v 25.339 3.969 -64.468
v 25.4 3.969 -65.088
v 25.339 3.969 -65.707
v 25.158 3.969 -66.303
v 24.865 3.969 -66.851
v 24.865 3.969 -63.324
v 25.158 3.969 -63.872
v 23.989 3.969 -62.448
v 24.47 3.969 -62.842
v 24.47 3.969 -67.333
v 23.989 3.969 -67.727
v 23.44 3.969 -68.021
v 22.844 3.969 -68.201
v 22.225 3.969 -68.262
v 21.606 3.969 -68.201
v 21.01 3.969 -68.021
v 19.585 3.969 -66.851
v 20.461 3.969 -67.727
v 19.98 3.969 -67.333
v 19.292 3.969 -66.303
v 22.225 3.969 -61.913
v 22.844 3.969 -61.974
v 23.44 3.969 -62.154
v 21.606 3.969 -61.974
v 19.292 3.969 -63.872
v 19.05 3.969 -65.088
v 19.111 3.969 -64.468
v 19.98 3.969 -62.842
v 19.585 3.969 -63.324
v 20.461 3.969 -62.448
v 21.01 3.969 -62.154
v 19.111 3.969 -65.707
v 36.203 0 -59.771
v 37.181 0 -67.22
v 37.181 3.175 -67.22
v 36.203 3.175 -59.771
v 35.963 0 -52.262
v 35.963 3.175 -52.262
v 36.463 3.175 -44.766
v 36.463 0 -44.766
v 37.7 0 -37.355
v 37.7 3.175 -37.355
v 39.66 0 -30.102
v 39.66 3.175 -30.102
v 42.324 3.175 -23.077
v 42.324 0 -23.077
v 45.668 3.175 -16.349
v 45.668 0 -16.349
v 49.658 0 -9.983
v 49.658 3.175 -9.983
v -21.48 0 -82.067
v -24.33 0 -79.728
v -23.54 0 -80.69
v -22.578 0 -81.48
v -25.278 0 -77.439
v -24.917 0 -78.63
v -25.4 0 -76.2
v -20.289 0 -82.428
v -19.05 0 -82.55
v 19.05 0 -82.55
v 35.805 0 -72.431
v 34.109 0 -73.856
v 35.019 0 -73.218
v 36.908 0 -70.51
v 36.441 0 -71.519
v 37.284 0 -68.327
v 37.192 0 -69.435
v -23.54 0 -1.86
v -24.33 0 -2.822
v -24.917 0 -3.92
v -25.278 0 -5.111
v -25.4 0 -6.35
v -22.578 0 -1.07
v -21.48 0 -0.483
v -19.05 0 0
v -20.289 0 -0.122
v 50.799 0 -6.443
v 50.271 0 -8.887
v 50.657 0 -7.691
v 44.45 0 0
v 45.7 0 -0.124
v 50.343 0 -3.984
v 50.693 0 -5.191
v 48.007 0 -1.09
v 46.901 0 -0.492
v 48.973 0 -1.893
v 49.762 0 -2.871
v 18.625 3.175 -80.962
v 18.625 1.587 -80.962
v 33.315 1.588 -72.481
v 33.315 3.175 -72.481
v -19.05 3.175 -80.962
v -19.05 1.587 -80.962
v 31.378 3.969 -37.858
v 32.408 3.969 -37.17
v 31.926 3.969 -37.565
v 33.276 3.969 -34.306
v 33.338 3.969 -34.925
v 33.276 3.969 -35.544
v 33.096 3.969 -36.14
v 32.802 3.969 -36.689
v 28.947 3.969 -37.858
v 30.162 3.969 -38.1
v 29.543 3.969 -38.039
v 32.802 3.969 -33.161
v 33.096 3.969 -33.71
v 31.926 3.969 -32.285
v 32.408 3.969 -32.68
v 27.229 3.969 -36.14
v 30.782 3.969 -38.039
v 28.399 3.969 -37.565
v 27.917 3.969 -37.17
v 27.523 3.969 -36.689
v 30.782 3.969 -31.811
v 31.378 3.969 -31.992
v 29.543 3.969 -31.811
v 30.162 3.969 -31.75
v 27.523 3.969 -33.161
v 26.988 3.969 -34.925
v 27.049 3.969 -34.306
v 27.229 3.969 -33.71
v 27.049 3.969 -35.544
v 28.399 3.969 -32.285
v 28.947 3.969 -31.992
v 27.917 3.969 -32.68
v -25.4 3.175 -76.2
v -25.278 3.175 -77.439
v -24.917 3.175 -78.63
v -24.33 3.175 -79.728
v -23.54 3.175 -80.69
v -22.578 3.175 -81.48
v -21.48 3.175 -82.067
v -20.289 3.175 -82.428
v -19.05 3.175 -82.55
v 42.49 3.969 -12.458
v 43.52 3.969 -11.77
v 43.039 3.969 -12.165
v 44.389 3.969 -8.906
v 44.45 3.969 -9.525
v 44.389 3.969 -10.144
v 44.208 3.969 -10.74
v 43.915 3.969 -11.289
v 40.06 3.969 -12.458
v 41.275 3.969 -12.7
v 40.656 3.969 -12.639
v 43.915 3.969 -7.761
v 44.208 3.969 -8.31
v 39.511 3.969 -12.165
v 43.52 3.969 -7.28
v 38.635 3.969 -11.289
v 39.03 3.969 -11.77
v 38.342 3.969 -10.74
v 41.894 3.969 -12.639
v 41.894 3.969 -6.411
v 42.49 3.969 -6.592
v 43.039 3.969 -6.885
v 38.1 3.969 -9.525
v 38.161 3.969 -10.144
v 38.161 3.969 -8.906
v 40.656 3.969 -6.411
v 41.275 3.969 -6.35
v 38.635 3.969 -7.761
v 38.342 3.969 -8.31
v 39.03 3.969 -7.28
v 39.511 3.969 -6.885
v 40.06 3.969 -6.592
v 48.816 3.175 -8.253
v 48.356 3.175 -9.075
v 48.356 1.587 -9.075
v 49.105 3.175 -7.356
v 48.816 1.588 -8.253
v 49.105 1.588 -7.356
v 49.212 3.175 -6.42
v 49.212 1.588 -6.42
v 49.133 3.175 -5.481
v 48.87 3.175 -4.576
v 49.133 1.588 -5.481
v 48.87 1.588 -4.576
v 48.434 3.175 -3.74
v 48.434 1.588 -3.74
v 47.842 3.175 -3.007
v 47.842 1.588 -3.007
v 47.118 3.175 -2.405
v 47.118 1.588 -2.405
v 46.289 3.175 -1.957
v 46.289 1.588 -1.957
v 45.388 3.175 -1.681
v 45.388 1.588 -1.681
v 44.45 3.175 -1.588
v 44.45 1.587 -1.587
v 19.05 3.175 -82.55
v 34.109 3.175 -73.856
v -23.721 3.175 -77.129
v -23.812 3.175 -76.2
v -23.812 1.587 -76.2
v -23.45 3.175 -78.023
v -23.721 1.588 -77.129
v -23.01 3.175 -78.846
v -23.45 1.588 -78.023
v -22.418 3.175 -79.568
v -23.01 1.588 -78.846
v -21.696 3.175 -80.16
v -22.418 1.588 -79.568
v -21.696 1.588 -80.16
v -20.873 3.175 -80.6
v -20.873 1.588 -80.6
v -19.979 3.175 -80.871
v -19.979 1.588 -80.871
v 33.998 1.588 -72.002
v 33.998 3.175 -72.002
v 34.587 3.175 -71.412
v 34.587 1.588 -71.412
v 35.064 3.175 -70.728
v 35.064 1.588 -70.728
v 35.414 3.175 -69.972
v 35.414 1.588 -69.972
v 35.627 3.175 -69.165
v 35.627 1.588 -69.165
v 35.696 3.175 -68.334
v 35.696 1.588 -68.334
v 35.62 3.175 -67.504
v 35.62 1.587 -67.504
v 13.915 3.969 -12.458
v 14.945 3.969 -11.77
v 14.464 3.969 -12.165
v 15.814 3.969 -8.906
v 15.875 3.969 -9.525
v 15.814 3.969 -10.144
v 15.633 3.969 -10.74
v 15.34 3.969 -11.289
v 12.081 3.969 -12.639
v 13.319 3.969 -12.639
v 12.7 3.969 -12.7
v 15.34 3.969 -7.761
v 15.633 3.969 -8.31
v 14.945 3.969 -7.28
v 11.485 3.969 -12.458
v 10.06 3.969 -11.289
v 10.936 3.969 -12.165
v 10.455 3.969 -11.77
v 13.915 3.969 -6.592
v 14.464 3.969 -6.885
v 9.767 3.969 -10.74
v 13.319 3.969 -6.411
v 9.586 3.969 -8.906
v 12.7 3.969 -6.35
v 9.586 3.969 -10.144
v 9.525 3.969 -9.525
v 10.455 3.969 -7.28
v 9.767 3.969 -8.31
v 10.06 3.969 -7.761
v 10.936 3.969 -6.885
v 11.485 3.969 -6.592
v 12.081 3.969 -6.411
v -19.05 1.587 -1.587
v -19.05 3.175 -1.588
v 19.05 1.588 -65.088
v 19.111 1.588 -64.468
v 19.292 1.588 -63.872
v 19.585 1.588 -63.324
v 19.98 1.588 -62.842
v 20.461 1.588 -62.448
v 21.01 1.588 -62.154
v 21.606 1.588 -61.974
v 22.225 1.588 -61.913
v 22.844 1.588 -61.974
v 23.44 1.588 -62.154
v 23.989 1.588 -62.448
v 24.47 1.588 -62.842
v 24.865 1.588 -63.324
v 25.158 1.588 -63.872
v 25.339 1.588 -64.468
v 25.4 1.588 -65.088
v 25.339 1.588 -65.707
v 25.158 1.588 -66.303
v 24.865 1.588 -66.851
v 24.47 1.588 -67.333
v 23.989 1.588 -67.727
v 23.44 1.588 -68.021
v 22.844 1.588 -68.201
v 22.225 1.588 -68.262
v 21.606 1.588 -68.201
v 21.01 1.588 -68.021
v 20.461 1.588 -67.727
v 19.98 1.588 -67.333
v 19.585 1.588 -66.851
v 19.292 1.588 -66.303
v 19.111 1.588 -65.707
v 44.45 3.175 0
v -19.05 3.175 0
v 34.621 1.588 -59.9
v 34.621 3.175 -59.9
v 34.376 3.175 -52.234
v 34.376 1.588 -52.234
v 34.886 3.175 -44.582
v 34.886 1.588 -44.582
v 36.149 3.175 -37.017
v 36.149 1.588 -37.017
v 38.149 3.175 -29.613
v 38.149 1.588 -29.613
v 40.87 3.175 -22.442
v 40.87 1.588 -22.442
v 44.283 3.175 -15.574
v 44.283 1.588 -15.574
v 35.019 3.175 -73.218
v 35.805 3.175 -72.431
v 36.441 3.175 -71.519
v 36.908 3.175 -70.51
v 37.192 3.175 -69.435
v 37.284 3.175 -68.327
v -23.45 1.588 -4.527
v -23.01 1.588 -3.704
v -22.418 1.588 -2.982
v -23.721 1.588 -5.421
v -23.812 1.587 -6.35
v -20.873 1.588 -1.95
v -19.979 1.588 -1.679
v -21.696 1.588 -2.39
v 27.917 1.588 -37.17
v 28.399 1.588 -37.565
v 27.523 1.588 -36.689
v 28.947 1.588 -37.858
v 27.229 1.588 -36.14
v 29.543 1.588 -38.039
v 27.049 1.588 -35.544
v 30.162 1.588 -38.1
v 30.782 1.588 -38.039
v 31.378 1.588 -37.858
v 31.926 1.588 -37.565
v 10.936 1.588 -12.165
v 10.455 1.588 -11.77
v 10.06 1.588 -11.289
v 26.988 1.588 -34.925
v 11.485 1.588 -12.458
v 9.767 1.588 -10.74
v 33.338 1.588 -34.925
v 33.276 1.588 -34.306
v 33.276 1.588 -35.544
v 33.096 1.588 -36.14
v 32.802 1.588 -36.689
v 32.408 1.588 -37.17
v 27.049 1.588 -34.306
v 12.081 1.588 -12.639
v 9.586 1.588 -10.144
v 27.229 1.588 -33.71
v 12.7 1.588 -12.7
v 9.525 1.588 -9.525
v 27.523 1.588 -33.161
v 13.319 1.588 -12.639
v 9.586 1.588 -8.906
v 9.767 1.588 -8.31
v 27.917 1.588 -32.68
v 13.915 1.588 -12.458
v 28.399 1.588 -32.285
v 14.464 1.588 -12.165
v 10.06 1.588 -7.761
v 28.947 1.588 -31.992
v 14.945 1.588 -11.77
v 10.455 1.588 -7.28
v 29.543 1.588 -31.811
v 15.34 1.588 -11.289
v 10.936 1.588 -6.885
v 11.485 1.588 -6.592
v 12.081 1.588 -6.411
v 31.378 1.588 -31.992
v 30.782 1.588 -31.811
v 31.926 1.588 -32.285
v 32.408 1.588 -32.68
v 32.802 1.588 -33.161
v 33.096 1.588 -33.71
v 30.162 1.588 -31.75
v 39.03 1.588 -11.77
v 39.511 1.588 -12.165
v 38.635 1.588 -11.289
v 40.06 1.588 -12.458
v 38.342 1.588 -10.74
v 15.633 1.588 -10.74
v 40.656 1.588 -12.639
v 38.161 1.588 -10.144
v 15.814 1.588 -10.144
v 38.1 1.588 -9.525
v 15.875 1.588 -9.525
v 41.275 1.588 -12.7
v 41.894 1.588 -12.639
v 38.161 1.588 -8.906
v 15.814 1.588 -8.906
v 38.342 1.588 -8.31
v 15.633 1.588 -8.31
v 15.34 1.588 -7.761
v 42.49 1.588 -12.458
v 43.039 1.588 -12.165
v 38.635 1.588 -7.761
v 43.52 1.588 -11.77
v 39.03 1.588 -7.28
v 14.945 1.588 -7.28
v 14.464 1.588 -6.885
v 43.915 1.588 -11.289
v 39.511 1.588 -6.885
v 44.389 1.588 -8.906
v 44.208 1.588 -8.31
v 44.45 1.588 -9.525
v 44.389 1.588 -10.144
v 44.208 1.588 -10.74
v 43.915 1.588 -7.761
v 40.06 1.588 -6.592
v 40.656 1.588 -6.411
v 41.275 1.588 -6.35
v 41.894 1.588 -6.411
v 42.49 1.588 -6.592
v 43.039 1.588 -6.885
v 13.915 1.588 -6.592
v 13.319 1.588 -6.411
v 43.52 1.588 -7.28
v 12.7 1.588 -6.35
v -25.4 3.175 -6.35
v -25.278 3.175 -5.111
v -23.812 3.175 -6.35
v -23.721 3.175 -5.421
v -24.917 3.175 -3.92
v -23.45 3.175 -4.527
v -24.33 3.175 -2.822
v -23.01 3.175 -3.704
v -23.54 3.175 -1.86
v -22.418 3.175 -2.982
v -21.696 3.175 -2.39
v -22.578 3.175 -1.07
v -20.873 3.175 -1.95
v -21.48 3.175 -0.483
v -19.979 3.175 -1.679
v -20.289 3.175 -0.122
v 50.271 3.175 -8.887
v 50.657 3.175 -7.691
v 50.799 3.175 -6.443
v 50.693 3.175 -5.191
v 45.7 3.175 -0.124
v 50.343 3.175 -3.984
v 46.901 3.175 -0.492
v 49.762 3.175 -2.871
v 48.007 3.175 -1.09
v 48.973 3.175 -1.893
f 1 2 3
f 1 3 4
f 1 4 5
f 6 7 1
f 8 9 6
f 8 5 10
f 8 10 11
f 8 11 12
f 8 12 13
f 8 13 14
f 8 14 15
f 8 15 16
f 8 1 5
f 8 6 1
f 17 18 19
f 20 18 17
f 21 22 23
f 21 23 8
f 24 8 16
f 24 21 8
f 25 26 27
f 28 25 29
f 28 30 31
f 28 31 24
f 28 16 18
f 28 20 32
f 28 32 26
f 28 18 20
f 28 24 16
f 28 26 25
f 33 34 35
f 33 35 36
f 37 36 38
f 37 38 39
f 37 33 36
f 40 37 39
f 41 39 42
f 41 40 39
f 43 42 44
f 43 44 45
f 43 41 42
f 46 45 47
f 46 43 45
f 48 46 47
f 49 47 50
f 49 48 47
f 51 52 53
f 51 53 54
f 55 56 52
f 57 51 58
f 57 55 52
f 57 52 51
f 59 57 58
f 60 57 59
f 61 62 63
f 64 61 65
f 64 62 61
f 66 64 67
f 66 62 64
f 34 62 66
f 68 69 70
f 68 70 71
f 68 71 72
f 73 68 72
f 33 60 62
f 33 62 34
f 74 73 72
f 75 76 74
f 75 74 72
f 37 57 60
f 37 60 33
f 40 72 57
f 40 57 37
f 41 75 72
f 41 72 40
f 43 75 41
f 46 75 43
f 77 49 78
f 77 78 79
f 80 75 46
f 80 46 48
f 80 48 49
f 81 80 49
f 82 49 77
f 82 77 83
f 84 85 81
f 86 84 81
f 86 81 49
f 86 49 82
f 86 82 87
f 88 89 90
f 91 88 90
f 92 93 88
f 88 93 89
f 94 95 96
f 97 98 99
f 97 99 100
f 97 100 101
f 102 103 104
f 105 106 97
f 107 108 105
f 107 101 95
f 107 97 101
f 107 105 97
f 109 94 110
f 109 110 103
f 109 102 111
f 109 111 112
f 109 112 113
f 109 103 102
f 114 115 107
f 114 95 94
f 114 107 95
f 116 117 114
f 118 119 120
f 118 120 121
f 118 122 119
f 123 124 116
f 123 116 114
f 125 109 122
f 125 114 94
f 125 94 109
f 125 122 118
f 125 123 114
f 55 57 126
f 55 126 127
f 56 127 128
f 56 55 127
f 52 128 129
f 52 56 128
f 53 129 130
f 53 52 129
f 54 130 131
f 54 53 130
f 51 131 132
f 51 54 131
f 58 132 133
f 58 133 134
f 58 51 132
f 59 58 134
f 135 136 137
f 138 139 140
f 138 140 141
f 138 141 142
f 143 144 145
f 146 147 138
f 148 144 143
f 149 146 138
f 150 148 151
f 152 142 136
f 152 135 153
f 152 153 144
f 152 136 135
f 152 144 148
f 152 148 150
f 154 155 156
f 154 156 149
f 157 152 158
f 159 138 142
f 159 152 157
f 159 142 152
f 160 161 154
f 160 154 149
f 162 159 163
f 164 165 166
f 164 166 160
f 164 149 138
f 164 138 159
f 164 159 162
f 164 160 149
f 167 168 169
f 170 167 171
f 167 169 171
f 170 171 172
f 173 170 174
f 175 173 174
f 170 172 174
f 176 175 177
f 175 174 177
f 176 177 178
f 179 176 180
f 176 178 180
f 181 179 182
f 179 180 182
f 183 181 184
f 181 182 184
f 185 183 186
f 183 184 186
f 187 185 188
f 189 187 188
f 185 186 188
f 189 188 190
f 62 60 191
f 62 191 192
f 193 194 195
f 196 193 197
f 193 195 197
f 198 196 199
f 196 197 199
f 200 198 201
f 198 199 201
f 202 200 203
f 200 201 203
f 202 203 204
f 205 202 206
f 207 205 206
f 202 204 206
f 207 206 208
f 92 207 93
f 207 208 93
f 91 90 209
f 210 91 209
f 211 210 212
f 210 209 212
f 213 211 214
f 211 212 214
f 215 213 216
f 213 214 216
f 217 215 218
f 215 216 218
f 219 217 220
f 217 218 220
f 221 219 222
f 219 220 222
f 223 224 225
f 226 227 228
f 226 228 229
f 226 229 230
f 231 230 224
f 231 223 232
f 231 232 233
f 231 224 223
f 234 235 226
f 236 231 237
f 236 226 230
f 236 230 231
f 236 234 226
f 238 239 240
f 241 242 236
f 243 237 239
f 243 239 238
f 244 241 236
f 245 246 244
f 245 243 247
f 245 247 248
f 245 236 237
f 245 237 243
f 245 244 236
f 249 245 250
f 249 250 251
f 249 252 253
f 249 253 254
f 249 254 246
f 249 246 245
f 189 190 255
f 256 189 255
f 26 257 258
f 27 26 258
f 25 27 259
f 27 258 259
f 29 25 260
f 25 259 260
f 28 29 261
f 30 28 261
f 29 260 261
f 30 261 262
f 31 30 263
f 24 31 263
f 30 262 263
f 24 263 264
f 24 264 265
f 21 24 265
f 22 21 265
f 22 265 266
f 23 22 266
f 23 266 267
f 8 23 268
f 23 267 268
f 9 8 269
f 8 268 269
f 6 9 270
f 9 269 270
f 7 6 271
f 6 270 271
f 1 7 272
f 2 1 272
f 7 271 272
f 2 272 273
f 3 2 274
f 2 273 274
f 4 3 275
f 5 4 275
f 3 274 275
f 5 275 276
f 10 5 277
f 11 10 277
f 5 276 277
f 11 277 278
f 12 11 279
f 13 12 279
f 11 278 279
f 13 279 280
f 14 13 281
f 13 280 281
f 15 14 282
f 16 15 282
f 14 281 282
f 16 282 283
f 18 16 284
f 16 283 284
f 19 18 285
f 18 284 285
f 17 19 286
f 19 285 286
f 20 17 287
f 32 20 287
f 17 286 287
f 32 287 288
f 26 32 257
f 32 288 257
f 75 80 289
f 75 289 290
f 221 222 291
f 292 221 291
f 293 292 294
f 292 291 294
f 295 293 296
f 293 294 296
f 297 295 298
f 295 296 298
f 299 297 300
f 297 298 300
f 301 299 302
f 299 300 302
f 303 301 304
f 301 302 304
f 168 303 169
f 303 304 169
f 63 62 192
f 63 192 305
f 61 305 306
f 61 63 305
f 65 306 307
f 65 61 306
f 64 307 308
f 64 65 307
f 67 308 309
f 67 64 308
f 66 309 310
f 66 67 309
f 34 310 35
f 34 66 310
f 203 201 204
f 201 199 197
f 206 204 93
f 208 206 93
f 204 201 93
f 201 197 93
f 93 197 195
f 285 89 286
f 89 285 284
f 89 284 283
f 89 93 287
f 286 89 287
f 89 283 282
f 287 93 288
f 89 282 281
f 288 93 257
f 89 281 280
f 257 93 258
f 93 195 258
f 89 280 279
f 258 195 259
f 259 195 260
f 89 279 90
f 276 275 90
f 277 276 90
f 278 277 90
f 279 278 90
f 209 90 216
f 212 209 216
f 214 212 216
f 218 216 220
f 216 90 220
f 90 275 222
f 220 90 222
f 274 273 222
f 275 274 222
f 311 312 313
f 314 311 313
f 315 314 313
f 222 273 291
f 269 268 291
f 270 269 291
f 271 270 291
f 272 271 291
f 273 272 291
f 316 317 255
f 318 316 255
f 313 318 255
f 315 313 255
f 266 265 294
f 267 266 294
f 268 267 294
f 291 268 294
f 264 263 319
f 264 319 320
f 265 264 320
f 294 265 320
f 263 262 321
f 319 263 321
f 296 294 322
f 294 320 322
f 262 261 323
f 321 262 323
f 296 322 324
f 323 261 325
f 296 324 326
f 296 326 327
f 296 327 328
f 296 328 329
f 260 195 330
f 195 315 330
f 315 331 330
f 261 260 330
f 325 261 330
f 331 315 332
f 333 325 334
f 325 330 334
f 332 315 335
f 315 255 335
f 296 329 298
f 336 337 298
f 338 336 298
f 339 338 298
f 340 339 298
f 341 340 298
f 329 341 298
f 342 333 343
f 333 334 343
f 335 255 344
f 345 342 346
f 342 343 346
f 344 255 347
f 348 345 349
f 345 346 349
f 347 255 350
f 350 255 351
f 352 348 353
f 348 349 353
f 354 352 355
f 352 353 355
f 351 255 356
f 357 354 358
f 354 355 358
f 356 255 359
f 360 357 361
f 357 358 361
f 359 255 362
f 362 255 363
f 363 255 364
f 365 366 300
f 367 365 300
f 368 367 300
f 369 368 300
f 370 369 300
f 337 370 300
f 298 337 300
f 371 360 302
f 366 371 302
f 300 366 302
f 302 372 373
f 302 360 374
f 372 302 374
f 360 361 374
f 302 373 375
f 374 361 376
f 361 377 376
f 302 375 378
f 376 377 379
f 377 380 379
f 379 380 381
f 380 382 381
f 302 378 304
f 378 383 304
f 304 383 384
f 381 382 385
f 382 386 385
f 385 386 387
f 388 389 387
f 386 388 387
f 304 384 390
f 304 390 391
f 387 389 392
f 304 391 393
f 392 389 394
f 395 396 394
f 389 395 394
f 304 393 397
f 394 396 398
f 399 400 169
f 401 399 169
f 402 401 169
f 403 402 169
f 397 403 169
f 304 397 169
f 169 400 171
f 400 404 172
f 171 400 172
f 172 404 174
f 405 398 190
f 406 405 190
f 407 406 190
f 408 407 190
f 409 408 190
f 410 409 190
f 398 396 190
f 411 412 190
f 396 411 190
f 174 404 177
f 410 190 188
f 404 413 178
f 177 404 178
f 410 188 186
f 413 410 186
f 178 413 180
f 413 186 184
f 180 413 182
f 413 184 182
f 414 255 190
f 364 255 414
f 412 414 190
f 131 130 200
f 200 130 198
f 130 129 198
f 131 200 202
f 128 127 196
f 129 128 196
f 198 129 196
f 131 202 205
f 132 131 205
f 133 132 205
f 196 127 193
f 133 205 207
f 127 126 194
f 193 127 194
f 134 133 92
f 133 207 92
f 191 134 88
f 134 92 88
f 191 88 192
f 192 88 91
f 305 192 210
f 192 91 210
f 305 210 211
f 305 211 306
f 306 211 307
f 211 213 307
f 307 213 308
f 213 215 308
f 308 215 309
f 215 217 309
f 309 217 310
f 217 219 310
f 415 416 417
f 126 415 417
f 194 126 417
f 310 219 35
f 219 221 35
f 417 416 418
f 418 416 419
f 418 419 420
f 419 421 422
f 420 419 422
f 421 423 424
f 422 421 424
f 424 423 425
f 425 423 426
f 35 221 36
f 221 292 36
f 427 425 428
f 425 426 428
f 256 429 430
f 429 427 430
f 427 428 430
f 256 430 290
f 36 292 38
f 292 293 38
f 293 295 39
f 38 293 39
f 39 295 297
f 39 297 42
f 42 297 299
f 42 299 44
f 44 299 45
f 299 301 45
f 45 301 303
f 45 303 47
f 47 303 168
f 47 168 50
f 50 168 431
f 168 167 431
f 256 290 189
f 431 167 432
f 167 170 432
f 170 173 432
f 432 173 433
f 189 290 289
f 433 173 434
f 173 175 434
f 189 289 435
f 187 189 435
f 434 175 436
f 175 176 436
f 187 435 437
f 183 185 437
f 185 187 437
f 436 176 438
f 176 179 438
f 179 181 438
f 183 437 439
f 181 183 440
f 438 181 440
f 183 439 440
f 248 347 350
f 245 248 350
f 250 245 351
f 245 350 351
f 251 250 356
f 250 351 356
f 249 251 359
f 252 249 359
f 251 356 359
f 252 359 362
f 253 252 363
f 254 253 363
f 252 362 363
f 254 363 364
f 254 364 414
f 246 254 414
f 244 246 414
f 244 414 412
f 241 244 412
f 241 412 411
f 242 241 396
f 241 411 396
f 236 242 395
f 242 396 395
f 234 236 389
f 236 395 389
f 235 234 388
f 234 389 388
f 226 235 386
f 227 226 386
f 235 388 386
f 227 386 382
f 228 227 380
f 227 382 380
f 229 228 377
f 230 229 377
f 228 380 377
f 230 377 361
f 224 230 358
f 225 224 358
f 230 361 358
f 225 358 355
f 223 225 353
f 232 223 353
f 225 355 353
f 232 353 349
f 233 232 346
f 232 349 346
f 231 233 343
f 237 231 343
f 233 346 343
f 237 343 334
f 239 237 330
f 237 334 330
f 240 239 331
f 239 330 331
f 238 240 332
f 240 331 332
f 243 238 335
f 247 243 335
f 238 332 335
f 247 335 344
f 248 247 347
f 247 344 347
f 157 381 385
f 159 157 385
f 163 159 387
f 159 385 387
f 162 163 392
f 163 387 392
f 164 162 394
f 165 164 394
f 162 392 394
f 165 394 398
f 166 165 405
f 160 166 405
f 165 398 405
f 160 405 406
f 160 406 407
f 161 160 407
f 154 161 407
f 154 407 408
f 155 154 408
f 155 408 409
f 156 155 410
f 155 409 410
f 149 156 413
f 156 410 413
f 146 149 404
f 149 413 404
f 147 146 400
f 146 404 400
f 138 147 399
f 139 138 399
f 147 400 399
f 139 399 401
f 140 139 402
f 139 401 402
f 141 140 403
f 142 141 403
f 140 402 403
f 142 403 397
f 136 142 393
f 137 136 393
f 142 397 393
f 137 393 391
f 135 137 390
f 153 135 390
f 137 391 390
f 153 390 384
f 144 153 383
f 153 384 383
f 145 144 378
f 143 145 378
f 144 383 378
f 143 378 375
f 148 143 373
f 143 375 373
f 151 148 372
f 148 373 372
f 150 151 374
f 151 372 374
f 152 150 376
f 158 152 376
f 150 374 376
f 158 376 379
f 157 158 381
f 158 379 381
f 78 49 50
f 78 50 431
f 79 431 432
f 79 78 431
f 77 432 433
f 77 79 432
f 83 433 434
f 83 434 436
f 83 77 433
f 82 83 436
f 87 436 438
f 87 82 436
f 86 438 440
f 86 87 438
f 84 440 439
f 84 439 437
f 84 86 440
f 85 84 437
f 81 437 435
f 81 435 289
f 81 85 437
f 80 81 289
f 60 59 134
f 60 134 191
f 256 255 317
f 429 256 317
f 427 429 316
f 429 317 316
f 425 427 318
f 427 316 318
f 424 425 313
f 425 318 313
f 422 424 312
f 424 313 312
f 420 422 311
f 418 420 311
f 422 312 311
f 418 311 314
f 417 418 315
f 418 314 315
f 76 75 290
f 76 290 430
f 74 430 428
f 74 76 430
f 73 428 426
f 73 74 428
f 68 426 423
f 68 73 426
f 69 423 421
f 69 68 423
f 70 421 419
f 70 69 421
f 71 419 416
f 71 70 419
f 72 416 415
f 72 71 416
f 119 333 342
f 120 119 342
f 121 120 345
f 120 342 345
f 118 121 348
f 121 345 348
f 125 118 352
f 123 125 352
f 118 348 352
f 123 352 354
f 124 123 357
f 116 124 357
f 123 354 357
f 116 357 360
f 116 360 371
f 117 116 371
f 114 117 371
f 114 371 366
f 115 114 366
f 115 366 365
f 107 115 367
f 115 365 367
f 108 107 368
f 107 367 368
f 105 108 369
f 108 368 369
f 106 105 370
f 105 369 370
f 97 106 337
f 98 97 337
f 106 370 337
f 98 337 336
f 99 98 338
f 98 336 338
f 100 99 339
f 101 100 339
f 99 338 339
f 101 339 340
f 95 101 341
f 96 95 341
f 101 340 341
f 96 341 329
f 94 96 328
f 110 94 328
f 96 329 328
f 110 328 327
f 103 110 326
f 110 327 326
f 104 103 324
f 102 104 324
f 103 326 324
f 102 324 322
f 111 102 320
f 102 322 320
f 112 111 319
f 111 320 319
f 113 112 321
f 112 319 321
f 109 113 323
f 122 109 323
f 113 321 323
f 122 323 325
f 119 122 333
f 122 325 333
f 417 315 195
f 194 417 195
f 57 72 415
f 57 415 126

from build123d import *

# Parameters (mm, degrees)
F1_DEPTH = 3.175
F2_T     = -1.5875
F3_R     = 3.175
F4_DEPTH = 2.38125


with BuildPart() as f1:
    # F0 (on Front) → F1 (new body)
    with BuildSketch(Plane.XZ):
        with BuildLine():
            Line((44.45, 0), (-19.05, 0))
            ThreePointArc((-19.05, 0), (-23.540128, -1.859872), (-25.4, -6.35))
            Line((-25.4, -6.35), (-25.4, -76.2))
            ThreePointArc((-25.4, -76.2), (-23.540128, -80.690128), (-19.05, -82.55))
            Line((-19.05, -82.55), (19.05, -82.55))
            Line((19.05, -82.55), (34.108921, -73.855728))
            ThreePointArc((34.108921, -73.855728), (36.696187, -71.024571), (37.181415, -67.220106))
            ThreePointArc((37.181415, -67.220106), (37.699595, -37.354898), (49.657796, -9.983368))
            ThreePointArc((49.657796, -9.983368), (50.080026, -3.413113), (44.45, 0))
        make_face()
    extrude(amount=-F1_DEPTH)

    # F2
    f2_openings = [f1.faces().sort_by_distance(p)[0] for p in [
        (7.276457, 3.175, -39.048077),
    ]]
    offset(amount=F2_T, openings=f2_openings)

    # F3 (on face) → F4 (join)
    with BuildSketch(Plane(origin=(0, 1.5875, 0), x_dir=(-1, 0, 0), z_dir=(0, 1, 0))):
        with Locations((-41.275, -9.525)):
            Circle(F3_R)
        with Locations((-12.7, -9.525)):
            Circle(F3_R)
        with Locations((-30.1625, -34.925)):
            Circle(F3_R)
        with Locations((-22.225, -65.0875)):
            Circle(F3_R)
    extrude(amount=F4_DEPTH)


solid = f1.part
